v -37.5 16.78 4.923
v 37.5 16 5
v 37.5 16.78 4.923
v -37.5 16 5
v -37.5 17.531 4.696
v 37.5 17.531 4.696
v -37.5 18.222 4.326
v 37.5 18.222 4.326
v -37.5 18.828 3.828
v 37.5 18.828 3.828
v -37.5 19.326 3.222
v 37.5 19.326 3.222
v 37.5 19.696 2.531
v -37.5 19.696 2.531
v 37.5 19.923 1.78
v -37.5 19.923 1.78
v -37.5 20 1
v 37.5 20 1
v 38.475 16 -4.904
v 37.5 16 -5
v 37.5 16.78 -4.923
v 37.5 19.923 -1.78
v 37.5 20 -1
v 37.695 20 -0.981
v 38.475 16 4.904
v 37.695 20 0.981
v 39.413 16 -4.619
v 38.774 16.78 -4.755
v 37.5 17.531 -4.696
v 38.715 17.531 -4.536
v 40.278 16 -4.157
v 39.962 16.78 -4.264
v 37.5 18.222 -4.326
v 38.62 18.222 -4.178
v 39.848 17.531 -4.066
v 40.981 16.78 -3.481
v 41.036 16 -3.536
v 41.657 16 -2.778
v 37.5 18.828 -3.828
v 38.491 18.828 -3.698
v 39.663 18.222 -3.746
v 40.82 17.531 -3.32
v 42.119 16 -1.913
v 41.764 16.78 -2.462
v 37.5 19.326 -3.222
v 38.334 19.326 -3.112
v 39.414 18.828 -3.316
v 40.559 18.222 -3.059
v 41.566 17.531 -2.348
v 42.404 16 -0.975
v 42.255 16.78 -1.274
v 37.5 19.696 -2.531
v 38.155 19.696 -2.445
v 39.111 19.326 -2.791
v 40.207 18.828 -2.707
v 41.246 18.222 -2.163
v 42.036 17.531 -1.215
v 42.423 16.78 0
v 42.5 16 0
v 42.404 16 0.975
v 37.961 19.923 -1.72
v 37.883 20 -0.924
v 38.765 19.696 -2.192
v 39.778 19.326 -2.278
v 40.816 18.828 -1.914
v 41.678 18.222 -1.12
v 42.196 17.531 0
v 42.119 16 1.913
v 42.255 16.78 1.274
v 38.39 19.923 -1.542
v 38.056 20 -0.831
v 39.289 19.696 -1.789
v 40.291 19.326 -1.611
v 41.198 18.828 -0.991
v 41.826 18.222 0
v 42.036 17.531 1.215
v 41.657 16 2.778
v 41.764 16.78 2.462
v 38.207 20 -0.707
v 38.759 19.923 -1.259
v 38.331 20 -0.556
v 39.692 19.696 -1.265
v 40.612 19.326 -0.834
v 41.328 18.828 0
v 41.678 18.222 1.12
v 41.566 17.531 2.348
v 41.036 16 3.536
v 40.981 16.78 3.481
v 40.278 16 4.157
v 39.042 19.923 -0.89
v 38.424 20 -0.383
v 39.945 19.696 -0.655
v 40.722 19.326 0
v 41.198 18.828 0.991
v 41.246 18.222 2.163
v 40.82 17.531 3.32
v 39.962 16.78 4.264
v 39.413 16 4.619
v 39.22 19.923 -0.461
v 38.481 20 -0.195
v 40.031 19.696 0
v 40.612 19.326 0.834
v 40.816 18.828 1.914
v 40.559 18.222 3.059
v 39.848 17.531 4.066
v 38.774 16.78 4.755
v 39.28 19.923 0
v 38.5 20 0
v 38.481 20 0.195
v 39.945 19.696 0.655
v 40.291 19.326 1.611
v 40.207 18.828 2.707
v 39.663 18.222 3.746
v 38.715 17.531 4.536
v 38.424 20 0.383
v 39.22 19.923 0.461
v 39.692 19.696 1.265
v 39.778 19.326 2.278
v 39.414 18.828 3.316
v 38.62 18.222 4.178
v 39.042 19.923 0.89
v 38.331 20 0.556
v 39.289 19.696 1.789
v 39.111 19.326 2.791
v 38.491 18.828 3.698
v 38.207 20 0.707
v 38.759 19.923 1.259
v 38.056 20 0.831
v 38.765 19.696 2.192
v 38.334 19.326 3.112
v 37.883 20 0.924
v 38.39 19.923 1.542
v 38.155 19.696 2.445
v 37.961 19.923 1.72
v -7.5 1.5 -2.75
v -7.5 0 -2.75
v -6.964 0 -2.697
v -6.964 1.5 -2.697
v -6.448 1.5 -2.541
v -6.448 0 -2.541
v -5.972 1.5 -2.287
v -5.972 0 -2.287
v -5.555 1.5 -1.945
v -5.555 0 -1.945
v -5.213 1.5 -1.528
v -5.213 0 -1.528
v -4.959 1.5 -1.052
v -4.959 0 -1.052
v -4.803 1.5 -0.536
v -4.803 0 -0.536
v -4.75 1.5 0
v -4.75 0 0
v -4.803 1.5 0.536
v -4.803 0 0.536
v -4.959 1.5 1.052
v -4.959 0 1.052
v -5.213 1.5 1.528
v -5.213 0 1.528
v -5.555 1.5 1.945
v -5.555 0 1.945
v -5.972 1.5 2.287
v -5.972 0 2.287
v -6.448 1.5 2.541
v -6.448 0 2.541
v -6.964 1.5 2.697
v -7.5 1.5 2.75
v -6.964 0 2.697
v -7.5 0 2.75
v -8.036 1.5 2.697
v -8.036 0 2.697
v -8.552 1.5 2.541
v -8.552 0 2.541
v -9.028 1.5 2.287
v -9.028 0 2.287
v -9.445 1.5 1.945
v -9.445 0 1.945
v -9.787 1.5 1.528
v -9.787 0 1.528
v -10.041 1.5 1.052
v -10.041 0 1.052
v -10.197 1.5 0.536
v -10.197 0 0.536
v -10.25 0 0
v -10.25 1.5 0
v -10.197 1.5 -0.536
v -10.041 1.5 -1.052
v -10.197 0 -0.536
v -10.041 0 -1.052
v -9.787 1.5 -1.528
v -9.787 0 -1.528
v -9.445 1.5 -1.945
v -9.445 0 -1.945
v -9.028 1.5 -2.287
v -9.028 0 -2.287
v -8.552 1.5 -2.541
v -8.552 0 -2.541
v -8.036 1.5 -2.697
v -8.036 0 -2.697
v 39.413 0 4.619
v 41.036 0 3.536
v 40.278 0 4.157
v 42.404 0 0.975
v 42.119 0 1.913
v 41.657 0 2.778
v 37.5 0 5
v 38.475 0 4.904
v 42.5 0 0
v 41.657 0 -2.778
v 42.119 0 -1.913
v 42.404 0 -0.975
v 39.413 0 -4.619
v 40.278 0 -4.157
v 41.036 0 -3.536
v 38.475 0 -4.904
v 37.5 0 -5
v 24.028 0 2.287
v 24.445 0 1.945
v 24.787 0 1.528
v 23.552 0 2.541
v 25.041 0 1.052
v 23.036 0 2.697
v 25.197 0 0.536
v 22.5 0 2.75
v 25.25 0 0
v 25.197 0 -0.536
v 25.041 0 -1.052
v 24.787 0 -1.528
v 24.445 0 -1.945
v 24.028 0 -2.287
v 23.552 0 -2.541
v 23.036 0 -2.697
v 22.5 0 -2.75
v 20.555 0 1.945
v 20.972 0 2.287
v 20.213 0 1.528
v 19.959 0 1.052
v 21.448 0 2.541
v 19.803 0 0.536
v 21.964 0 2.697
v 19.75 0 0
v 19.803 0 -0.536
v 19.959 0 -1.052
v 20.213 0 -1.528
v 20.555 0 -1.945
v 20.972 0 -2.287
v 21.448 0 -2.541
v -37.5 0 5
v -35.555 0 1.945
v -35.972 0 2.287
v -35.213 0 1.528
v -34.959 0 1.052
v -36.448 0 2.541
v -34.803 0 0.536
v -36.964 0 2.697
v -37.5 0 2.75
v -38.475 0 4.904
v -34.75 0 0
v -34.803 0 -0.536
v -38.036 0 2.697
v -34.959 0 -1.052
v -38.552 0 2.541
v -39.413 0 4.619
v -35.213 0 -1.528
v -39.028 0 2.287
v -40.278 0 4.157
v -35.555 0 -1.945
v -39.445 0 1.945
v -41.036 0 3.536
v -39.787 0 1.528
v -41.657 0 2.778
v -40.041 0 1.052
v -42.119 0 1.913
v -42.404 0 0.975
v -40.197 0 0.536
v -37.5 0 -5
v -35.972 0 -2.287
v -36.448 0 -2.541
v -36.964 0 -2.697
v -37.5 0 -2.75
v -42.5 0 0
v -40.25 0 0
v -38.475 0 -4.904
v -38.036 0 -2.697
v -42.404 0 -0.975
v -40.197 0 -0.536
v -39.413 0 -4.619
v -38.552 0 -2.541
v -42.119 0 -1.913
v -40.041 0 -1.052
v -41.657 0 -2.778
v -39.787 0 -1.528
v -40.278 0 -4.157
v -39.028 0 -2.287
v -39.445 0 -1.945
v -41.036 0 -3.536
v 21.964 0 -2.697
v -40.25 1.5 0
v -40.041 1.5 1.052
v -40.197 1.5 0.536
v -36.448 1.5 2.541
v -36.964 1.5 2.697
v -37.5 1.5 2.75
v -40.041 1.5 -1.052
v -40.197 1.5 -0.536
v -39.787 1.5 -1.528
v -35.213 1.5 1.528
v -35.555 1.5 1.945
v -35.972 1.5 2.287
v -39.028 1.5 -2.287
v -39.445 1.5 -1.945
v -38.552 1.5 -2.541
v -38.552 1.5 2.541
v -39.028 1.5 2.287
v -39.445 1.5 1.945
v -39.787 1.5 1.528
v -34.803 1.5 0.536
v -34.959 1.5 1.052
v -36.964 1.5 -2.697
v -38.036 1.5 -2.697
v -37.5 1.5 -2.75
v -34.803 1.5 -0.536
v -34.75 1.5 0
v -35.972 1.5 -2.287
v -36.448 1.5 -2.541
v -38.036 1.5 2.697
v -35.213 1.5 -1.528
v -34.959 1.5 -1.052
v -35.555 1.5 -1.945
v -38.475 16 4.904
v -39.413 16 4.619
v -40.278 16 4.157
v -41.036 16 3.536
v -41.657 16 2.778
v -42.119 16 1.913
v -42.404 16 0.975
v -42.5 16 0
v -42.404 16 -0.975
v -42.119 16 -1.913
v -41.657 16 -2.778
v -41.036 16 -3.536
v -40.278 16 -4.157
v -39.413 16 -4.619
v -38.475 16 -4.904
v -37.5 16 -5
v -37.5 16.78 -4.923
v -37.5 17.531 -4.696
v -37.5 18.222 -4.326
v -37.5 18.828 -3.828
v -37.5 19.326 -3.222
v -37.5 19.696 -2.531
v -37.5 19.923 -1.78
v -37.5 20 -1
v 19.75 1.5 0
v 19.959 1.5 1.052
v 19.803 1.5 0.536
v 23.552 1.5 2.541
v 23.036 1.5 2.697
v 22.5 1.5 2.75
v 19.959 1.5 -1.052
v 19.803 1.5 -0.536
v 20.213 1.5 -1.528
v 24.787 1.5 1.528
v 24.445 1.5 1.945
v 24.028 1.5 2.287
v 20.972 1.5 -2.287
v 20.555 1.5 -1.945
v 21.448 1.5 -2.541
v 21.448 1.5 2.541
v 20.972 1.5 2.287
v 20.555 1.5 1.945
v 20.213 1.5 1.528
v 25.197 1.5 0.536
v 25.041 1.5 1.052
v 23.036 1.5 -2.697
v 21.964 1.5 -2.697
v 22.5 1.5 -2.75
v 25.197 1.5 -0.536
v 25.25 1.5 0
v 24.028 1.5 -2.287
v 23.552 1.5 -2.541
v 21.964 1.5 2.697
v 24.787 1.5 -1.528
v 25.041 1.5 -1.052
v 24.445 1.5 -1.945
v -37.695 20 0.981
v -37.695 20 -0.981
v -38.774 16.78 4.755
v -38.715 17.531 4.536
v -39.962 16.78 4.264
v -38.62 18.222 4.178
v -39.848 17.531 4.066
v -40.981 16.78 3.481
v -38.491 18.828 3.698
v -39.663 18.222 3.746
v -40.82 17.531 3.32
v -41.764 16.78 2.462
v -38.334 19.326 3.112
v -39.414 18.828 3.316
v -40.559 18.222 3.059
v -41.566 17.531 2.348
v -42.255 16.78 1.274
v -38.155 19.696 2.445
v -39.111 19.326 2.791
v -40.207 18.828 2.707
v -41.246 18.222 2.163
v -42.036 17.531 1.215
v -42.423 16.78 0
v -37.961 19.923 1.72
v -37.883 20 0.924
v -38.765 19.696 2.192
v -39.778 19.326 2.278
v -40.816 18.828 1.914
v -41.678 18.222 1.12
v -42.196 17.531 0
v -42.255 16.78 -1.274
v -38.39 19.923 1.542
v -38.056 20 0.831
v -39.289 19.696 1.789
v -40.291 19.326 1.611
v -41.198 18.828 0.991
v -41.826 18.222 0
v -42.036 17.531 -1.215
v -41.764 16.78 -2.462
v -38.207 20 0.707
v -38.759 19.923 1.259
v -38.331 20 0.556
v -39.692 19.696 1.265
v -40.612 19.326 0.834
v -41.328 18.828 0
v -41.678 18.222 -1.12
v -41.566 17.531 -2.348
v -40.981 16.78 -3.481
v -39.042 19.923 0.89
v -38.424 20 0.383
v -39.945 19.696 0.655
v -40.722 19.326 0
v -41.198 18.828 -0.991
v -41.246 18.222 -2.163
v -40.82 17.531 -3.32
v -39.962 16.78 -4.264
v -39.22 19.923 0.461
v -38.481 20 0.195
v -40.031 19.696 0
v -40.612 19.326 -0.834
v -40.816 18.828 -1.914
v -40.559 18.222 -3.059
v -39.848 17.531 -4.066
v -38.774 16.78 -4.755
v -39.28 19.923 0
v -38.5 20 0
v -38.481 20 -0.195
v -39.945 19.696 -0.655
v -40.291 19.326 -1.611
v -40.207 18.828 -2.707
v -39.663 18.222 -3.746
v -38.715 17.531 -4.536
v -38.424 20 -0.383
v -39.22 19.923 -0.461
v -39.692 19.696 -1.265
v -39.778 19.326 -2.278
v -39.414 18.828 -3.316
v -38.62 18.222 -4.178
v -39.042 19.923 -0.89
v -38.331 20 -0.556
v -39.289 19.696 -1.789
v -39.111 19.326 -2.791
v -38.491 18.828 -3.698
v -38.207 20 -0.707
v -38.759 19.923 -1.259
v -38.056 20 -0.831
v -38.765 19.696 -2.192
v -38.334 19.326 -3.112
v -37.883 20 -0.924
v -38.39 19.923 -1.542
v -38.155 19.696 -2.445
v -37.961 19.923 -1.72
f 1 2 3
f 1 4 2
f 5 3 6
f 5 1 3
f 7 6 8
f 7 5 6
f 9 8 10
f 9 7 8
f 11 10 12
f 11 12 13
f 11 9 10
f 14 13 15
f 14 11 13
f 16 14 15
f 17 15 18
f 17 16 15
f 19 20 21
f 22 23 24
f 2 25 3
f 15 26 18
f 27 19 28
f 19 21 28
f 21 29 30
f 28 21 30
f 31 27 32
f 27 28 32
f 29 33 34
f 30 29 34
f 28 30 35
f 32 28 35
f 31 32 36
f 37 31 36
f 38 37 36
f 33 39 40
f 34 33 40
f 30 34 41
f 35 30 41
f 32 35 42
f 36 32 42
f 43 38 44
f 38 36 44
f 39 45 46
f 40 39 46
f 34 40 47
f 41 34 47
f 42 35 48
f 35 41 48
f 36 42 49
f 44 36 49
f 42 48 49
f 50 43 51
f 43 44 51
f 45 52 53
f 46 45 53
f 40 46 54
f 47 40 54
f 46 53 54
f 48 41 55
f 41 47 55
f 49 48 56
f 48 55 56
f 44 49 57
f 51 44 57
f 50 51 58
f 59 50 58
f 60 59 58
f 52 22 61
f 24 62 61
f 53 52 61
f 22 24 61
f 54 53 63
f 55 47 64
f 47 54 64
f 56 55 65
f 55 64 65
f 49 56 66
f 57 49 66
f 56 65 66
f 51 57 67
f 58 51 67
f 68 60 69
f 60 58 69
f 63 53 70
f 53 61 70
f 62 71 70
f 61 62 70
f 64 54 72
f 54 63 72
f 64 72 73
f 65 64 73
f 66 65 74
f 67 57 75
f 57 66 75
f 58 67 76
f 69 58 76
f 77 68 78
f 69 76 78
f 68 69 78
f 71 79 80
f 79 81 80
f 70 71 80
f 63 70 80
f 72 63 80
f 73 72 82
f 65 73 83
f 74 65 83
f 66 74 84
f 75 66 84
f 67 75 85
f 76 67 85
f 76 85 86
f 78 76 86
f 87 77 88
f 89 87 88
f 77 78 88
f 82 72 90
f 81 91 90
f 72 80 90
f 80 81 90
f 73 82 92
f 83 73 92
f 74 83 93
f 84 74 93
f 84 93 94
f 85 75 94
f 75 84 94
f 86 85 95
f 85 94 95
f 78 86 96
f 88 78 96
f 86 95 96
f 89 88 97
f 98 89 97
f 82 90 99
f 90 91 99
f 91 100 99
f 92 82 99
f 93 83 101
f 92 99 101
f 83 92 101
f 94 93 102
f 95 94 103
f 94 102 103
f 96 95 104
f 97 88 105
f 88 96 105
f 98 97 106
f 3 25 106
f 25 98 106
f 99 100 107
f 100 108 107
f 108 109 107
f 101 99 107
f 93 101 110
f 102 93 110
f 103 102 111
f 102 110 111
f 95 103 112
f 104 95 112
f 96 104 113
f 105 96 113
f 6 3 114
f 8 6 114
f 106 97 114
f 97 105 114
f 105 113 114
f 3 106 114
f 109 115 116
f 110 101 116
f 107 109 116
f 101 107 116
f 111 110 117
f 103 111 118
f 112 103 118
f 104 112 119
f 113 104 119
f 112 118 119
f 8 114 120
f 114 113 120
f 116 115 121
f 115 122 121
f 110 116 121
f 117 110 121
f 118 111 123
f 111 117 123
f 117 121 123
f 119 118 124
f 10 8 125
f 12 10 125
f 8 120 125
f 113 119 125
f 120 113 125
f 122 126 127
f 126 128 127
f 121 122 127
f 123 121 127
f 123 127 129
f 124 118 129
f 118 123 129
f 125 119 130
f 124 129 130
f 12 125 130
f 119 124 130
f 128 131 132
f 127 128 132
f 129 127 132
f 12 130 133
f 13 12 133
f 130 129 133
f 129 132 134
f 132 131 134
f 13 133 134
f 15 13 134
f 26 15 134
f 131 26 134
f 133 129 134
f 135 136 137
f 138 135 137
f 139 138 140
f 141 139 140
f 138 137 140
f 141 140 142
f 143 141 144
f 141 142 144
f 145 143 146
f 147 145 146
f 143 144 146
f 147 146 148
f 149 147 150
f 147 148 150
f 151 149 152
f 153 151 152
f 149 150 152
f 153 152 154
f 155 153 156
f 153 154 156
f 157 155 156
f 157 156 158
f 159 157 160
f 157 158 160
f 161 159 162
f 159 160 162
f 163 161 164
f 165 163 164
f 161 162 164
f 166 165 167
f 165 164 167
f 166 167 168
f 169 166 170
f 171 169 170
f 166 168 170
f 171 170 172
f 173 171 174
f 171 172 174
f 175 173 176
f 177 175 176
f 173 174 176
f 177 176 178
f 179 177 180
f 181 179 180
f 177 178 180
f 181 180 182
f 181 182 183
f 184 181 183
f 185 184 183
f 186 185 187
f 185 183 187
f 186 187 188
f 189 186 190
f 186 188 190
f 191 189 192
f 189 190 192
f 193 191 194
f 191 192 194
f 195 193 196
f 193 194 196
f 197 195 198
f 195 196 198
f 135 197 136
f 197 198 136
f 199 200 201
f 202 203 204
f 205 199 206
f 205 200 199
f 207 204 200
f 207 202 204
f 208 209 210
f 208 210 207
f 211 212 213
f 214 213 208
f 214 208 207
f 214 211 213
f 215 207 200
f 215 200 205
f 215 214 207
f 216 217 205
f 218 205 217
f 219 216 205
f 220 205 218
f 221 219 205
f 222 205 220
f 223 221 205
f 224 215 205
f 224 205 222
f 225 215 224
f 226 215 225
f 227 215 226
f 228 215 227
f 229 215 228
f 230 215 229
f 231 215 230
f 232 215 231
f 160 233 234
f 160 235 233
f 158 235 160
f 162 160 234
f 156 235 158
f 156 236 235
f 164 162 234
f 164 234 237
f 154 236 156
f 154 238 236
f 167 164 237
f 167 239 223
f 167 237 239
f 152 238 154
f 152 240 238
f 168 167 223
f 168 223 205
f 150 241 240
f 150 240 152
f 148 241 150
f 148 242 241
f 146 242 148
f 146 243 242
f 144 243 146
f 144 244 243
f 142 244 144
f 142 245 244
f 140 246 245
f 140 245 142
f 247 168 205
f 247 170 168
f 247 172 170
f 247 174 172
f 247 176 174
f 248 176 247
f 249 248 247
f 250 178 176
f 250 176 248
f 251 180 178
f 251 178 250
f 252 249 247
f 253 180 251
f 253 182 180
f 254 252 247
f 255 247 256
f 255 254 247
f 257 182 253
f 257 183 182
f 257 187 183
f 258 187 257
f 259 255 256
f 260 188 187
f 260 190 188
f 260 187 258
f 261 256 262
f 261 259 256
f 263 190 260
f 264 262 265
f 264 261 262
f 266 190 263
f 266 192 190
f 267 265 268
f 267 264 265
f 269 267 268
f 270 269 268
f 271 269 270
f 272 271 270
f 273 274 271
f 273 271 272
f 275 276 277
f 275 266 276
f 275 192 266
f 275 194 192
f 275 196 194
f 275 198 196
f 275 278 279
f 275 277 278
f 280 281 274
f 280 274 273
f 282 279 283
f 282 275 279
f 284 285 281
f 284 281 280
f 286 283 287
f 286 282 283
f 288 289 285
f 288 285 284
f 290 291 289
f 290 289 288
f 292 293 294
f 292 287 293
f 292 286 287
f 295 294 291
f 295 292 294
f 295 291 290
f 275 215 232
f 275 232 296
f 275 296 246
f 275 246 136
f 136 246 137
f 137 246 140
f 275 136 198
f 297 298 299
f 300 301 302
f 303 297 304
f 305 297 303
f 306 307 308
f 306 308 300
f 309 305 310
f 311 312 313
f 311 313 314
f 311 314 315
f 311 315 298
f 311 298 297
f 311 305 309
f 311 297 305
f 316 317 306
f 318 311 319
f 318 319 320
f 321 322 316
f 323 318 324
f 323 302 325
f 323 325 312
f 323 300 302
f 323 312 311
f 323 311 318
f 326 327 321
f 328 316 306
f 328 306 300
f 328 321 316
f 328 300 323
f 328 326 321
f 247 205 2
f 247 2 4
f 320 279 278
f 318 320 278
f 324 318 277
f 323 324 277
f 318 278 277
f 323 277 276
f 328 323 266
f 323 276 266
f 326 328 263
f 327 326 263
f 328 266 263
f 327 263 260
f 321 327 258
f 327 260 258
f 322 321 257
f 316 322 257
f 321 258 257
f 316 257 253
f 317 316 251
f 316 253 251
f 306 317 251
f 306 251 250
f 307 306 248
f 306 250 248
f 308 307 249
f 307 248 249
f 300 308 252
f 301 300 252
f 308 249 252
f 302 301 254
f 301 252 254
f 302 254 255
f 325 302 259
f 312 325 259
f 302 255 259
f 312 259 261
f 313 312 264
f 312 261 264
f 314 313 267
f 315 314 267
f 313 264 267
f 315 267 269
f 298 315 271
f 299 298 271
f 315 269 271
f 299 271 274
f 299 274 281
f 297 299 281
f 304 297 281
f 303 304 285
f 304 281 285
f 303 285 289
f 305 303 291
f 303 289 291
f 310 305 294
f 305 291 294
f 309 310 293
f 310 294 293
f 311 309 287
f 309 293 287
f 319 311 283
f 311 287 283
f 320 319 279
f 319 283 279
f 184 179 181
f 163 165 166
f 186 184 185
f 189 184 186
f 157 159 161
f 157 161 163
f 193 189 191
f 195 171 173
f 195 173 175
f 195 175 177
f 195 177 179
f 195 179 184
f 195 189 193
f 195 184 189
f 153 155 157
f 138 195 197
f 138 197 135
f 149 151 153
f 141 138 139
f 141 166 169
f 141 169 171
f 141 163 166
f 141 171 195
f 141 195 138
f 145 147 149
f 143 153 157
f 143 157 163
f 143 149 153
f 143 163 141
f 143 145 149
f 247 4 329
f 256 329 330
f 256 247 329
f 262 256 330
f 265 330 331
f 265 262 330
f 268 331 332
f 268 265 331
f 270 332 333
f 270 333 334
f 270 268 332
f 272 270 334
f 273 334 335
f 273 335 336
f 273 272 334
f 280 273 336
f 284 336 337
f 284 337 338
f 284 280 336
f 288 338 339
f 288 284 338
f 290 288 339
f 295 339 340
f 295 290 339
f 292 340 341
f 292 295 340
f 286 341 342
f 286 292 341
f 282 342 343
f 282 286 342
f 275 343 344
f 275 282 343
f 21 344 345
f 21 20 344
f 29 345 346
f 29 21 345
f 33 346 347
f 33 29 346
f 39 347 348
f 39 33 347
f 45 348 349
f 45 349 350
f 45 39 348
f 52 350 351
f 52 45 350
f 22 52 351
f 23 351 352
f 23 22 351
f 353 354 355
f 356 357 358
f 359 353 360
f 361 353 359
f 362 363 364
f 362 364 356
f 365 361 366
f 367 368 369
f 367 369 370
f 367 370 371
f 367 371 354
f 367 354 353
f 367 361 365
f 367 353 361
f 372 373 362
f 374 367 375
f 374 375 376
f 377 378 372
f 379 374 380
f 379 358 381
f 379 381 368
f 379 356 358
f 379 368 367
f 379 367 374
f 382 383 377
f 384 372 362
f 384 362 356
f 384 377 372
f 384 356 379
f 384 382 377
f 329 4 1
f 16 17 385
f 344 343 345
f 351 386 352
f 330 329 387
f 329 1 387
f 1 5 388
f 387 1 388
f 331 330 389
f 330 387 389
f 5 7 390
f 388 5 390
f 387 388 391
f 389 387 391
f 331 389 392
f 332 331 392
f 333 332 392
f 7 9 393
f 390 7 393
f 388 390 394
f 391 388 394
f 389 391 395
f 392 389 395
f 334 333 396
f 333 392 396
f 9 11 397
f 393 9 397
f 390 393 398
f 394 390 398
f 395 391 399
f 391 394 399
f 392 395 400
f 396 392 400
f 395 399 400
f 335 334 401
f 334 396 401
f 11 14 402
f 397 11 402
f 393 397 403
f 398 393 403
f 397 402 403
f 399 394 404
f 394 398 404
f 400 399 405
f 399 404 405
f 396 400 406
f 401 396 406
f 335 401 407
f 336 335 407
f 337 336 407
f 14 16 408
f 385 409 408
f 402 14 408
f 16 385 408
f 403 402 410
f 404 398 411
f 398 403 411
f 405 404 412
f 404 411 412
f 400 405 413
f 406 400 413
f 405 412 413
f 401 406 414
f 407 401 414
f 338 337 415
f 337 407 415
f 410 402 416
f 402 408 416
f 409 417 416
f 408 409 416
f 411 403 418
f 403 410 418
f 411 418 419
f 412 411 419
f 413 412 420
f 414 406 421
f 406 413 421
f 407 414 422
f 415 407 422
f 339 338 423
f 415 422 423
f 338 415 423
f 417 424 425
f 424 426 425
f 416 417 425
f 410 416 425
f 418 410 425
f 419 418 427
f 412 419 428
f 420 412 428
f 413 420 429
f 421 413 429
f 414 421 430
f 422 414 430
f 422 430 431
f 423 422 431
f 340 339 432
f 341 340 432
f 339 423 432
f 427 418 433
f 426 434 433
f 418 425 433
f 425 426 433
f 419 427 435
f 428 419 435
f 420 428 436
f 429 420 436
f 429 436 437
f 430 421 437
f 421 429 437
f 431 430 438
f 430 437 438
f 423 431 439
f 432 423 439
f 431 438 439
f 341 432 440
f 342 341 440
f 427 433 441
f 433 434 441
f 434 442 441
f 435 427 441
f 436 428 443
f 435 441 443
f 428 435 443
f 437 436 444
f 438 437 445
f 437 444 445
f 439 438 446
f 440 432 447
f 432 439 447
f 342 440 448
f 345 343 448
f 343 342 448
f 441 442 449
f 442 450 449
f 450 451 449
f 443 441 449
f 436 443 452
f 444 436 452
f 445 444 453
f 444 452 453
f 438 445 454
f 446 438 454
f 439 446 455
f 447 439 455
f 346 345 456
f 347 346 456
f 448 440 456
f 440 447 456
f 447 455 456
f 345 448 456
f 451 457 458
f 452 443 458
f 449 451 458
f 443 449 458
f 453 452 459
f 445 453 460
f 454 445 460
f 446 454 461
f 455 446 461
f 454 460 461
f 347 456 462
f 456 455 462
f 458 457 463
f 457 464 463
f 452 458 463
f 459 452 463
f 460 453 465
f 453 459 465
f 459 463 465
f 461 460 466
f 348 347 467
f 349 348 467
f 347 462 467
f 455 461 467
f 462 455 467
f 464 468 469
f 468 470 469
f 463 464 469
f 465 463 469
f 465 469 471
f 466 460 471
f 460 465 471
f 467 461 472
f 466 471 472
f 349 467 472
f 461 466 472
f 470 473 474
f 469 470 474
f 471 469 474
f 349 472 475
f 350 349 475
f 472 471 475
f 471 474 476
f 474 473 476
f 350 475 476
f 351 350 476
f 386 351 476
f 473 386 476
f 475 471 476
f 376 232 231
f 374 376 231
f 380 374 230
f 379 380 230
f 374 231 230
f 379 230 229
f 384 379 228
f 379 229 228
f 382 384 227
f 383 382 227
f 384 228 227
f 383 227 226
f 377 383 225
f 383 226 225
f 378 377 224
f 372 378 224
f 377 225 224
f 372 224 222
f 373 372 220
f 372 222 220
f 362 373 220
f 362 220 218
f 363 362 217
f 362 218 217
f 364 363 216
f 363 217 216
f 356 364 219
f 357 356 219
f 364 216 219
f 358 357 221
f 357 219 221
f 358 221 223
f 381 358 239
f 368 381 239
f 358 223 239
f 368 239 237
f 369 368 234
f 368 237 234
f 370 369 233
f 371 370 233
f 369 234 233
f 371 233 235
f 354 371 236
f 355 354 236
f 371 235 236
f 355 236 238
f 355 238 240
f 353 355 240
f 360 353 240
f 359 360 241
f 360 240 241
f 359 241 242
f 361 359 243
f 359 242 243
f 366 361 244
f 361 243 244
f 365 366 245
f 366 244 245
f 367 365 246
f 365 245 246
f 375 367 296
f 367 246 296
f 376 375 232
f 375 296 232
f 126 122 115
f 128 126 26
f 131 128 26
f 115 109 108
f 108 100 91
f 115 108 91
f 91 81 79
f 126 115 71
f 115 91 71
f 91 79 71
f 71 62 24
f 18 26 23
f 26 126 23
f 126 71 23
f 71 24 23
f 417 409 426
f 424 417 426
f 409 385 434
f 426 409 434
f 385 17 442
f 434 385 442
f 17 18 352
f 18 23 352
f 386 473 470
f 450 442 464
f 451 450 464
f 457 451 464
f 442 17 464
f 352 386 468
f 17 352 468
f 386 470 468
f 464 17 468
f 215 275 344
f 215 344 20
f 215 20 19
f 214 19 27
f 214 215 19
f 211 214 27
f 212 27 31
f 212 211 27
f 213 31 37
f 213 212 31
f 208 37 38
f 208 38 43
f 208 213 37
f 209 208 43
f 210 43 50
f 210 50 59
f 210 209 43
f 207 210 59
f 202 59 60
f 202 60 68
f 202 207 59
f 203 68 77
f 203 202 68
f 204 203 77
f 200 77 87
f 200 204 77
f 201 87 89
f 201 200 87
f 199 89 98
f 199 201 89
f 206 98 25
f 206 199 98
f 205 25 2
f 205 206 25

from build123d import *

# Parameters (mm, degrees)
BOSS_EXTRUDE1_DEPTH = 20
FILLET1_R           = 4
SKETCH2_R           = 2.75
CUT_EXTRUDE1_DEPTH  = 1.5
LPATTERN1_COUNT     = 3
LPATTERN1_PITCH     = 30


with BuildPart() as part:
    # Sketch1 → Boss-Extrude1 (new body)
    with BuildSketch(Plane(origin=(0, 0, 0), x_dir=(1, 0, 0), z_dir=(0, 1, 0))):
        with BuildLine():
            Line((37.5, -5), (-37.5, -5))
            ThreePointArc((-37.5, -5), (-42.5, 0), (-37.5, 5))
            Line((-37.5, 5), (37.5, 5))
            ThreePointArc((37.5, 5), (42.5, 0), (37.5, -5))
        make_face()
    extrude(amount=BOSS_EXTRUDE1_DEPTH)

    # Fillet1
    fillet1_edges = [part.edges().sort_by_distance(p)[0] for p in [
        (-42.5, 20, 0),
        (0, 20, 5),
        (42.5, 20, 0),
        (0, 20, -5),
    ]]
    fillet(fillet1_edges, radius=FILLET1_R)

    # Sketch2 → Cut-Extrude1 (cut)
    with BuildSketch(Plane.XZ):
        with Locations(Location((-37.5, 0, 0), (0, 0, 270))):
            Circle(SKETCH2_R)
    cut_extrude1 = extrude(amount=-CUT_EXTRUDE1_DEPTH, mode=Mode.SUBTRACT)

    # LPattern1: Cut-Extrude1 ×3
    with Locations(*[(i * LPATTERN1_PITCH, 0, 0) for i in range(1, LPATTERN1_COUNT)]):
        add(cut_extrude1, mode=Mode.SUBTRACT)


solid = part.part
